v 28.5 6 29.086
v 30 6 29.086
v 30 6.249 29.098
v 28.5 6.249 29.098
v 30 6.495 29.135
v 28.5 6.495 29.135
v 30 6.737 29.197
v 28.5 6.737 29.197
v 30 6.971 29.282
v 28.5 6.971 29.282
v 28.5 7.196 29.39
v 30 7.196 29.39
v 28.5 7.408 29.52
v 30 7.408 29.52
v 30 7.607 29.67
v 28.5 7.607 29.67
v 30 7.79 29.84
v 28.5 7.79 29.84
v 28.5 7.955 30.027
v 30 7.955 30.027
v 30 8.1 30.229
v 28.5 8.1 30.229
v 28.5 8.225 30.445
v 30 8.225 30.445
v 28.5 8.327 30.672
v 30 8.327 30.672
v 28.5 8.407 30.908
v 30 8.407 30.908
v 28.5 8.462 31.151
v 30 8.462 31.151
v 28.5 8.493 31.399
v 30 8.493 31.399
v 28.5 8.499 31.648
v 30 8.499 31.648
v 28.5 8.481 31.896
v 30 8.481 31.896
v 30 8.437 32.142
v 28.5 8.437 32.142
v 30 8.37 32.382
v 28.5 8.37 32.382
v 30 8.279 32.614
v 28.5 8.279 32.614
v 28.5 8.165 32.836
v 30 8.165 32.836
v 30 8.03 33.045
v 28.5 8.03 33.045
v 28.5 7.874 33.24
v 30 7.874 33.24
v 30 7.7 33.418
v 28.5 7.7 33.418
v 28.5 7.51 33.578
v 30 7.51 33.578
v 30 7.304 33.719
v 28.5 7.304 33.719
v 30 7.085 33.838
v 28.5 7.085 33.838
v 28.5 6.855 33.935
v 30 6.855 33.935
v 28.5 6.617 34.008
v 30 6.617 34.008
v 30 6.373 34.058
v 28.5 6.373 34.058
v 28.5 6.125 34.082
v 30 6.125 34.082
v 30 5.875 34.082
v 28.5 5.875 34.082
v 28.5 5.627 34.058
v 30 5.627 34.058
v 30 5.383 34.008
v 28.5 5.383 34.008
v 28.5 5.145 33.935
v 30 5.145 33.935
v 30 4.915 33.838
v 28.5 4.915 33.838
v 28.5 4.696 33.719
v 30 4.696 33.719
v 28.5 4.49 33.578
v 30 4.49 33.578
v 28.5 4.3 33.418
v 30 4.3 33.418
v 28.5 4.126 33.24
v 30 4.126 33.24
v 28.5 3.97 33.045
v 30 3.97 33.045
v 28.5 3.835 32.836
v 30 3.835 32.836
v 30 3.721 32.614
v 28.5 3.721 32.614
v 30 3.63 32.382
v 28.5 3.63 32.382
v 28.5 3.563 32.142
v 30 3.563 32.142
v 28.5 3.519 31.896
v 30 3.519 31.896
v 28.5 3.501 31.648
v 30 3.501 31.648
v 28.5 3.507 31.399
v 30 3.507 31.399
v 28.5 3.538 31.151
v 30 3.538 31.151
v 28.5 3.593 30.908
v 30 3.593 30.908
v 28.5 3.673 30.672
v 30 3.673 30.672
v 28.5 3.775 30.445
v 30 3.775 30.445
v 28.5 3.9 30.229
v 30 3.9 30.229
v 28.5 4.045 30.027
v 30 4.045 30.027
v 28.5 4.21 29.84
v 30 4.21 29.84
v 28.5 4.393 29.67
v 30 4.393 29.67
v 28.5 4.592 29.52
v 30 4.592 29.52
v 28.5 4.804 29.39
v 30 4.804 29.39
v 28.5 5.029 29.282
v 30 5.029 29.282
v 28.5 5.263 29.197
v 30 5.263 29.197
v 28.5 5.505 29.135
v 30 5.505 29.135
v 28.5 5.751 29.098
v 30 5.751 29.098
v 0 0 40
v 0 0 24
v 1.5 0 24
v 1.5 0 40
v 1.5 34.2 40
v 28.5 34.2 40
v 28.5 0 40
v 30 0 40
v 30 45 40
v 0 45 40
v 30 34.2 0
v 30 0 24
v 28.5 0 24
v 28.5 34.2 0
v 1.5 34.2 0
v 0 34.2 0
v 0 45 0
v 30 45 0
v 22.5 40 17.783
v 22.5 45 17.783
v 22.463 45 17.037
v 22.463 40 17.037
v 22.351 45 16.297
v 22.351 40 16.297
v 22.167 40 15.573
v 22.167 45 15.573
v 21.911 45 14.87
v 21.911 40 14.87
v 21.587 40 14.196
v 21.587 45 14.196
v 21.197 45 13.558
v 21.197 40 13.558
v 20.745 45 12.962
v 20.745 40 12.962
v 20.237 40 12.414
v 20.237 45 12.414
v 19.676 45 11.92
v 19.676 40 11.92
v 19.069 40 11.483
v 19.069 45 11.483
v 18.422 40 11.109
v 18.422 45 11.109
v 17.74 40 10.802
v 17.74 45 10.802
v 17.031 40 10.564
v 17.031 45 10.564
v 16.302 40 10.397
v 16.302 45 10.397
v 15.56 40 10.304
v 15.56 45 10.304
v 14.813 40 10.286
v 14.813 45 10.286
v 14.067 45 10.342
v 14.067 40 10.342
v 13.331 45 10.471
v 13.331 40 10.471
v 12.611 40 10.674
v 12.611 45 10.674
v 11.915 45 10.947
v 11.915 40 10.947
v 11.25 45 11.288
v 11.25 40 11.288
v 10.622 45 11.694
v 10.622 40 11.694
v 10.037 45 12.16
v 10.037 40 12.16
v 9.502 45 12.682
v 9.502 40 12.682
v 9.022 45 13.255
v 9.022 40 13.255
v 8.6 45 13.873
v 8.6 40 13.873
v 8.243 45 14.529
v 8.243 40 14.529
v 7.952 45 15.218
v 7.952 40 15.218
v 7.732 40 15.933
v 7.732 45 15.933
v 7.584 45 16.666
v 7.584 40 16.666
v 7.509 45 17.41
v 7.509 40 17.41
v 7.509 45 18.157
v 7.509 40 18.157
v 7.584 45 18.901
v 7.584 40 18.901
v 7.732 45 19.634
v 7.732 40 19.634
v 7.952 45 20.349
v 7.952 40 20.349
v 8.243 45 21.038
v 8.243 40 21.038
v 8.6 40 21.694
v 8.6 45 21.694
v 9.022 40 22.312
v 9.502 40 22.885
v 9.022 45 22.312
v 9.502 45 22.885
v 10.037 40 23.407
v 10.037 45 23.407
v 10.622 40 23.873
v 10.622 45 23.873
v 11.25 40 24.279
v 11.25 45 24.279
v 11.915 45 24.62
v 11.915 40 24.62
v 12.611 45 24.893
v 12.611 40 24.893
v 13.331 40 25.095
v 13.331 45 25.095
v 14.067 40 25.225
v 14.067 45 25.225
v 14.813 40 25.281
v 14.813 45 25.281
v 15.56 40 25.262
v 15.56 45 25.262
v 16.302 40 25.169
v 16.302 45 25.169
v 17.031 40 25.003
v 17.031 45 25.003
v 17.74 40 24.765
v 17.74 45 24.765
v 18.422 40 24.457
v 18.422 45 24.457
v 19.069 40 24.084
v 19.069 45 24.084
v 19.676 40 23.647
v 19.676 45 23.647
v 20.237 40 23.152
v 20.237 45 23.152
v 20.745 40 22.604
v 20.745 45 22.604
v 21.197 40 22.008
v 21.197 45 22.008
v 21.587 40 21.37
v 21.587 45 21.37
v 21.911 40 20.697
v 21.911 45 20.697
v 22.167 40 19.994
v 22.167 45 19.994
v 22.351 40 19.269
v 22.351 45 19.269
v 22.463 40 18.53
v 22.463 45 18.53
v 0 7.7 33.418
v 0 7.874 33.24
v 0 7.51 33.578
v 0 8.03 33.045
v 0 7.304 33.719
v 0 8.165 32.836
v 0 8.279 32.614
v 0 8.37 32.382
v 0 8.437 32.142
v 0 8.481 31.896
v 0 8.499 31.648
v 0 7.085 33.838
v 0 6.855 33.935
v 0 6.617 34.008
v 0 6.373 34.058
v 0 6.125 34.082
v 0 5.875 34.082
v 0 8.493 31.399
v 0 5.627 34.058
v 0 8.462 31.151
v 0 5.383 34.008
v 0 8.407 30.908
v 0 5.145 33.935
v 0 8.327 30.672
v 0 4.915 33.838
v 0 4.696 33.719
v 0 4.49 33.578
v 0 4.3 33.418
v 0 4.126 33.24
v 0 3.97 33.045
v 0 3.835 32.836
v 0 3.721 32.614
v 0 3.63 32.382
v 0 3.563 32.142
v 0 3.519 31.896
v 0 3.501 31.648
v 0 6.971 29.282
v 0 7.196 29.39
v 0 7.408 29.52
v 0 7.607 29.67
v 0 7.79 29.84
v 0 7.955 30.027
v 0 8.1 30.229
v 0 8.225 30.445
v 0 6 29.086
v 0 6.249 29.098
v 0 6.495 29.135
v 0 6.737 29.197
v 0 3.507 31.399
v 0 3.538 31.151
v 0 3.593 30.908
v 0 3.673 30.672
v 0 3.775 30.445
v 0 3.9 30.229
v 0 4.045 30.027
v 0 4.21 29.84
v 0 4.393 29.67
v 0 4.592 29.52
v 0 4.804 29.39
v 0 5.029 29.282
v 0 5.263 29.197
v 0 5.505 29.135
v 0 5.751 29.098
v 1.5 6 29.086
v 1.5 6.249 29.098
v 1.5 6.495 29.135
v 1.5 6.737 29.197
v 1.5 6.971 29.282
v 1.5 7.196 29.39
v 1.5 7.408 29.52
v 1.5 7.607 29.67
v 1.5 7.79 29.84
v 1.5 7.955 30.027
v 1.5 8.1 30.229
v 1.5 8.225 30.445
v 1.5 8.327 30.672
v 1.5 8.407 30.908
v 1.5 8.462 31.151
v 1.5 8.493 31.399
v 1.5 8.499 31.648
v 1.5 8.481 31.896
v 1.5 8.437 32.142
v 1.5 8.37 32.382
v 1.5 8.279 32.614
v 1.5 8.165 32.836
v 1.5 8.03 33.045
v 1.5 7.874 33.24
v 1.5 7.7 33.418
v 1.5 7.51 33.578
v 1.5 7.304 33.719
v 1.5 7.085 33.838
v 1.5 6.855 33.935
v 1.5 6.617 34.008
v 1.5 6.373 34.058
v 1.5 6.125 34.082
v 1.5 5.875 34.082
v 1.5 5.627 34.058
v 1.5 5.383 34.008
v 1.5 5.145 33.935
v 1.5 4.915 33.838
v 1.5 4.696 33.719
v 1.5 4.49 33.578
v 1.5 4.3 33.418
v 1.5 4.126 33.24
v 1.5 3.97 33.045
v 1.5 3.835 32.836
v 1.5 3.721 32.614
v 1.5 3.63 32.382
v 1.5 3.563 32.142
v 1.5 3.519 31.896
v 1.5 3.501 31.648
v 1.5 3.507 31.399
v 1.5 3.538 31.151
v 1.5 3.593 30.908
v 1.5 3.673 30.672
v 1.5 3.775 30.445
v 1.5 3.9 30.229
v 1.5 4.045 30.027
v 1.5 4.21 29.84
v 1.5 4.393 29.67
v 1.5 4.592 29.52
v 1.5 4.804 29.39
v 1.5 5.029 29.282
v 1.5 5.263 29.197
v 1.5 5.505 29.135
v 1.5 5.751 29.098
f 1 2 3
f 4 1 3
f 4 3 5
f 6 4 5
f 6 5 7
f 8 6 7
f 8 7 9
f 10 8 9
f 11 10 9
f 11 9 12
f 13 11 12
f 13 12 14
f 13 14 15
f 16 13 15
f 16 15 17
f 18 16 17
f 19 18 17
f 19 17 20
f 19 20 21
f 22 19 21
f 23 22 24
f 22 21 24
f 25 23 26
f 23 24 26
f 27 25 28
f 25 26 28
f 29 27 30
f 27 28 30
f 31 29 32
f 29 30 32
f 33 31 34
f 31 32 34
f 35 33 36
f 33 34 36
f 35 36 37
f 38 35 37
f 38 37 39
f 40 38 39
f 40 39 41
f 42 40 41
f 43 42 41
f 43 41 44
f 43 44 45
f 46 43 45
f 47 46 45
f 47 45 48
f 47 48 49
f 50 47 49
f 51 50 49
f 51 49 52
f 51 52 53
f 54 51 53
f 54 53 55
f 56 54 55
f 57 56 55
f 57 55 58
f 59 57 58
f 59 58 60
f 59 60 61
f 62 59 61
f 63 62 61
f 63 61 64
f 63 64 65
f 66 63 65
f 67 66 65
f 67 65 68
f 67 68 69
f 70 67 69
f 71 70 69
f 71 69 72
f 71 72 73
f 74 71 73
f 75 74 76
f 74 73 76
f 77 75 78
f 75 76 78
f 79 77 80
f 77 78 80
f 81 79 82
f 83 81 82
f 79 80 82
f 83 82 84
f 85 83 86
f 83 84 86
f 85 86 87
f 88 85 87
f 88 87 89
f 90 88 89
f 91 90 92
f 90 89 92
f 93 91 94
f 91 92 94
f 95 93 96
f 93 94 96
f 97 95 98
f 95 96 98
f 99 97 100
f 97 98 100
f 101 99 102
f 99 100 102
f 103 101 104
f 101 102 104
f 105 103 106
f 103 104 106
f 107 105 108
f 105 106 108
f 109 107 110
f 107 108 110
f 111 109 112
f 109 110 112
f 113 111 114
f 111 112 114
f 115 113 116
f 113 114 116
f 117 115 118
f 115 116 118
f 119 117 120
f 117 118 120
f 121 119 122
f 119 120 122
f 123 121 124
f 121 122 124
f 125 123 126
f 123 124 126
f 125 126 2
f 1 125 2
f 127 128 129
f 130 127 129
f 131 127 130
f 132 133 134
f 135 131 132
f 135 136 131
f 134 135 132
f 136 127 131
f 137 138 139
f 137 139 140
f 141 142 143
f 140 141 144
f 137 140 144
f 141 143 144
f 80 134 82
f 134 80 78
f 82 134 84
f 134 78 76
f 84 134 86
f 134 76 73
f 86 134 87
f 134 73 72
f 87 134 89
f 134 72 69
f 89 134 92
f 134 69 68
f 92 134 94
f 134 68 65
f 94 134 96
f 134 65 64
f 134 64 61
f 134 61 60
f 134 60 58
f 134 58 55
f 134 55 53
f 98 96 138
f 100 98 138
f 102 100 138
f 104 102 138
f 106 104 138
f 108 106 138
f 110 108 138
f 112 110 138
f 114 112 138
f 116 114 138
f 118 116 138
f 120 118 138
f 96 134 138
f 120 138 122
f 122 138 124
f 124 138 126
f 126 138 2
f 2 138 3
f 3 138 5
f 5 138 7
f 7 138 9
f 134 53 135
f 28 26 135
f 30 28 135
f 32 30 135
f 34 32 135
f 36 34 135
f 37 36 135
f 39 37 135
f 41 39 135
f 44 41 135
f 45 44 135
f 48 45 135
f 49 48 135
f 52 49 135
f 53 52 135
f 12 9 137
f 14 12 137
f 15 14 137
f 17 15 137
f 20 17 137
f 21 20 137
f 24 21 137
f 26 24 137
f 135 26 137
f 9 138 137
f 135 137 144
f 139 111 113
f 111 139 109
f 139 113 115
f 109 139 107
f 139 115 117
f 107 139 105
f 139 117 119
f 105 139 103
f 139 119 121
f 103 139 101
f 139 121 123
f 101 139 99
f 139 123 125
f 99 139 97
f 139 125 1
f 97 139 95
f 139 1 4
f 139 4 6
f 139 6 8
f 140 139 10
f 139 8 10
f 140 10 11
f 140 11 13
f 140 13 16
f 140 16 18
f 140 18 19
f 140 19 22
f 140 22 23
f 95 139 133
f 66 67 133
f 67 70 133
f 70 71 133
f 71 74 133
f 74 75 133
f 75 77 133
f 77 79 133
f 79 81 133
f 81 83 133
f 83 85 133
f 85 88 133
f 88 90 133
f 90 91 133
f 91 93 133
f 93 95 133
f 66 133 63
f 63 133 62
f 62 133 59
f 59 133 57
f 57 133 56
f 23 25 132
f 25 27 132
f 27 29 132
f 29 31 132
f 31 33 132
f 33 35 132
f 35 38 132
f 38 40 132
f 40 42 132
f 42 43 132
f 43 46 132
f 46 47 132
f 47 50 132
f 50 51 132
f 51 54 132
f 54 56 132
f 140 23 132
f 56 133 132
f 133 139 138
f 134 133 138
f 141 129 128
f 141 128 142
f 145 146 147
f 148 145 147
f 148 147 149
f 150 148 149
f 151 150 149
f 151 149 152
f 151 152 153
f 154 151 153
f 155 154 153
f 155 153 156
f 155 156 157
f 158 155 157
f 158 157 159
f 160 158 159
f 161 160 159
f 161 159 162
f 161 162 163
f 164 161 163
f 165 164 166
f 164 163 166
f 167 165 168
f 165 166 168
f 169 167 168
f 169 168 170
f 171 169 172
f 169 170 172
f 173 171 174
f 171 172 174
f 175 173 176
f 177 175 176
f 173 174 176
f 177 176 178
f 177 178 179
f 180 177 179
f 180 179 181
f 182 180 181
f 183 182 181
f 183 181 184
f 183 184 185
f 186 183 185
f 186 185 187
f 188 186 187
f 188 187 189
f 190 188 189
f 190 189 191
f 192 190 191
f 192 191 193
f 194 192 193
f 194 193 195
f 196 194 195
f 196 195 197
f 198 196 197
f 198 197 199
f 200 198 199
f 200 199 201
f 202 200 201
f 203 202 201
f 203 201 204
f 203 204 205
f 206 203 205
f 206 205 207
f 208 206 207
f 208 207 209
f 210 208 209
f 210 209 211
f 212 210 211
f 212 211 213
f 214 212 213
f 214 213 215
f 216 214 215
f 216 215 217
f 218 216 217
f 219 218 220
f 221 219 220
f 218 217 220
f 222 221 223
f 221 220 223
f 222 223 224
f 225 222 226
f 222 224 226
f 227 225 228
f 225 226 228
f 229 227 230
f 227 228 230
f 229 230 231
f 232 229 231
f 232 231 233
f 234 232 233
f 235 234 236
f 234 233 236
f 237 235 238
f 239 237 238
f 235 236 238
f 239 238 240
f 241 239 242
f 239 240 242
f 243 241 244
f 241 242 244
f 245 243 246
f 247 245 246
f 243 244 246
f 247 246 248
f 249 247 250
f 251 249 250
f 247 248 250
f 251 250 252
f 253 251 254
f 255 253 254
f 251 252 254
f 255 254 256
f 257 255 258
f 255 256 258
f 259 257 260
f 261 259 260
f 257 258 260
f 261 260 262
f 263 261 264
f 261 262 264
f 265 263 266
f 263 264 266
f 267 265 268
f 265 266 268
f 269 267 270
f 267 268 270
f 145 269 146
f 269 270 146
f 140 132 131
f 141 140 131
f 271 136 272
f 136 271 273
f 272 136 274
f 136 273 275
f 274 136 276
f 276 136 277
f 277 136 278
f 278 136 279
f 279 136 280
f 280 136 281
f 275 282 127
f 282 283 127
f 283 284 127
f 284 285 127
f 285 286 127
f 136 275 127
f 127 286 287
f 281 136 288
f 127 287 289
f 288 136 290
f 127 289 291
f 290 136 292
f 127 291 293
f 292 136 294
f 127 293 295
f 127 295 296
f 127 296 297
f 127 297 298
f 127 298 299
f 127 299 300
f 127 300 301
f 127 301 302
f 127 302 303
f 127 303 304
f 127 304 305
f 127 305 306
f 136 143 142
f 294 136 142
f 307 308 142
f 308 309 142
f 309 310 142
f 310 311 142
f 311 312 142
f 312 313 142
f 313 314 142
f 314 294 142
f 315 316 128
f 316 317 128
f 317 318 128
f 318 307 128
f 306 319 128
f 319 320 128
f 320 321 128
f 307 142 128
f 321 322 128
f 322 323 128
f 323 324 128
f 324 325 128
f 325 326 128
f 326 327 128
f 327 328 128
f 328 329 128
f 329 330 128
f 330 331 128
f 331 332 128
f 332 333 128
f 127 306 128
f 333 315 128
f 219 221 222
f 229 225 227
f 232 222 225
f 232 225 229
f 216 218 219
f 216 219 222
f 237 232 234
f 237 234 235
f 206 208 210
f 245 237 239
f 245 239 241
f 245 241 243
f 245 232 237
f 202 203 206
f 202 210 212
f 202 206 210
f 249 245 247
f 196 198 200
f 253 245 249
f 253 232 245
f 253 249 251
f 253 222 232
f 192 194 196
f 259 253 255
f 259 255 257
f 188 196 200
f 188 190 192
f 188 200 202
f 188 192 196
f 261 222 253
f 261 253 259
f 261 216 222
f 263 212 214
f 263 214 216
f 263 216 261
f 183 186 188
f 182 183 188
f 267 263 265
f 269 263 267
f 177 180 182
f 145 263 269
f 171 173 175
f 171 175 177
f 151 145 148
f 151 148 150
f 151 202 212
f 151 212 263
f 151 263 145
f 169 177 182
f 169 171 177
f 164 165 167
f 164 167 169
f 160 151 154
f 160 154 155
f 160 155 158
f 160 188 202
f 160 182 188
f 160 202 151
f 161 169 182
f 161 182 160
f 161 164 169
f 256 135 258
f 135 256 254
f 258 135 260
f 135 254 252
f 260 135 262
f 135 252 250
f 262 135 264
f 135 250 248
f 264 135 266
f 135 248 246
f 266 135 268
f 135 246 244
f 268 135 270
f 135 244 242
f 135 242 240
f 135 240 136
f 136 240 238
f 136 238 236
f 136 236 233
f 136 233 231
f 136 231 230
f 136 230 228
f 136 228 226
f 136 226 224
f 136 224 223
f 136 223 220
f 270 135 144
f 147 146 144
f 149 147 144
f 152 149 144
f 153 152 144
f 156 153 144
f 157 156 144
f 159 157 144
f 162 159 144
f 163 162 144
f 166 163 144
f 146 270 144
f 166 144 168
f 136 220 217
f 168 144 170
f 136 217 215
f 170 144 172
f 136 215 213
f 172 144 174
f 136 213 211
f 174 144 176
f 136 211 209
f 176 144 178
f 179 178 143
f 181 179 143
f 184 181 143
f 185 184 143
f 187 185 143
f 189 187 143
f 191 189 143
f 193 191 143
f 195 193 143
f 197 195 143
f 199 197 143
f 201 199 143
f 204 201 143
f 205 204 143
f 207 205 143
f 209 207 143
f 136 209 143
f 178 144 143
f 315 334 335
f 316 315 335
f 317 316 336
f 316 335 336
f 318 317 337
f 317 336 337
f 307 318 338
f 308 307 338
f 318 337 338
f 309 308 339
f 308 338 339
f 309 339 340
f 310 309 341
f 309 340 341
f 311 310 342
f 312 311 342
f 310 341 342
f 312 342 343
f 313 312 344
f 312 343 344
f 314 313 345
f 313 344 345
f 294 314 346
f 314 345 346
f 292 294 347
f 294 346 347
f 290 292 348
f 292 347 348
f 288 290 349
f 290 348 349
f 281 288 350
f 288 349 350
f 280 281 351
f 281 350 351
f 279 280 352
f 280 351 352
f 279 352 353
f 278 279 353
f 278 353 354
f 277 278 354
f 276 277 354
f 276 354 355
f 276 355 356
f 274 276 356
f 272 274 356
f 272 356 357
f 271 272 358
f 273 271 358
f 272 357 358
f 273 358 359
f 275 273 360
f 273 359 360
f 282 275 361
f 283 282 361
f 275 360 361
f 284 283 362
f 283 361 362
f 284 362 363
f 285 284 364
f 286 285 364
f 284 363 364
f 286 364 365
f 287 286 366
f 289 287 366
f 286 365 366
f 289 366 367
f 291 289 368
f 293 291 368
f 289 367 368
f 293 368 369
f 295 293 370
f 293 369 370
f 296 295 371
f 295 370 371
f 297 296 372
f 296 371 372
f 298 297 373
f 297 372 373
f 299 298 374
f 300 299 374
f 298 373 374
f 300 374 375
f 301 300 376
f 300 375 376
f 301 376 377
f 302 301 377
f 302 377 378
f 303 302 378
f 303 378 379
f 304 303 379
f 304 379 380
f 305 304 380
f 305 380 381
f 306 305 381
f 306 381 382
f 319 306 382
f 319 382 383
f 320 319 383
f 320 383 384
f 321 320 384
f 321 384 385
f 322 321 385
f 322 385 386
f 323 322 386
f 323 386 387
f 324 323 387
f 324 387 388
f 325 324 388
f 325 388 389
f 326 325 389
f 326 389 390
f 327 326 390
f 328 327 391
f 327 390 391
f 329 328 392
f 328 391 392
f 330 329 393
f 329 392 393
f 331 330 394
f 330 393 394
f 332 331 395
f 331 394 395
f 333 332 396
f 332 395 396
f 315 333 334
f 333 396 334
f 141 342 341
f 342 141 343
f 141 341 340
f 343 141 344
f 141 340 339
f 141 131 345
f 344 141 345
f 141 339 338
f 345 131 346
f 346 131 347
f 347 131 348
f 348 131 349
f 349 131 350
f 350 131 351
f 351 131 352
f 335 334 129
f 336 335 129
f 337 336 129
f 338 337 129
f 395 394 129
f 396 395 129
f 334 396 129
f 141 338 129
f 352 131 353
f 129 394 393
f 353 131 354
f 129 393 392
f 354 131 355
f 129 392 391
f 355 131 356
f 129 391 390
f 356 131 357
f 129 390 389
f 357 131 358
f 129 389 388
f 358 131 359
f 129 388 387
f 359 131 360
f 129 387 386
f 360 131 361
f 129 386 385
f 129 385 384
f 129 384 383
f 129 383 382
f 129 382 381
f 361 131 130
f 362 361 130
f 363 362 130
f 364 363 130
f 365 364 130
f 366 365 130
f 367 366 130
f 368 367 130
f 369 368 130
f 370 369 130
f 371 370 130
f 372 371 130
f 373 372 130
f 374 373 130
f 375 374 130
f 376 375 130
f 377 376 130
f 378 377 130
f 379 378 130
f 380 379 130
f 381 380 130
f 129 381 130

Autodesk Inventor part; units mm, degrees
ref_plane "YZ Plane" through (0, 0, 0) normal (1, 0, 0) x (0, 1, 0)
ref_plane "XZ Plane" through (0, 0, 0) normal (0, 1, 0) x (-1, 0, 0)
ref_plane "XY Plane" through (0, 0, 0) normal (0, 0, 1) x (1, 0, 0)
sketch "Sketch1" plane through (0, 0, 0) normal (0, 0, 1) x (1, 0, 0)
  line L0 (0, 0) -> (30, 0)
  line L1 (30, 0) -> (30, 45)
  line L2 (30, 45) -> (0, 45)
  line L3 (0, 45) -> (0, 0)
  dimension "d0" = 30
  dimension "d1" = 45
extrude "Extrusion1" add sketch "Sketch1" along normal blind 40
sketch "Sketch2" plane through (0, 45, 0) normal (0, 1, 0) x (1, 0, 0)
  circle A0 centre (15, -17.7834) radius 7.5
  line L0 (30, -40) -> (0, -40) projected
  point P0 (0, 0)
  point P1 (15, -40)
  dimension "d4" = 15
  dimension "d5" = 22.2166
extrude "Extrusion2" cut sketch "Sketch2" against normal blind 5
sketch "Sketch3" plane through (30, 0, 0) normal (1, 0, 0) x (0, 0, -1)
  circle A0 centre (-31.5856, 6) radius 2.5
  line L0 (0, 0) -> (-40, 0) projected
  line L1 (-40, 0) -> (-40, 45) projected
  dimension "d8" = 5
  dimension "d9" = 6
  dimension "d10" = 8.4144
extrude "Extrusion3" cut sketch "Sketch3" against normal through all
sketch "Sketch4" plane through (0, 0, 40) normal (0, 0, 1) x (1, 0, 0)
  line L0 (0, 45) -> (0, 0) projected
  line L1 (30, 0) -> (30, 45) projected
  line L2 (0, 0) -> (30, 0) projected
  line L3 (1.5, 0) -> (28.5, 0)
  line L4 (28.5, 0) -> (28.5, 34.2)
  line L5 (28.5, 34.2) -> (1.5, 34.2)
  line L6 (1.5, 34.2) -> (1.5, 0)
  point P0 (15, 0)
  dimension "d13" = 27
  dimension "d14" = 34.2
extrude "Extrusion4" cut sketch "Sketch4" against normal through all
sketch "Sketch5" plane through (30, 0, 0) normal (1, 0, 0) x (0, 0, -1)
  line L0 (-24, 0) -> (0, 34.2)
  line L1 (0, 0) -> (0, 45) projected
  line L2 (0, 0) -> (-40, 0) projected
  point P0 (-40, 34.2)
  dimension "d17" = 24
extrude "Extrusion5" cut sketch "Sketch5" against normal through all
properties part number "link_b2" material "ABS Plastic"
